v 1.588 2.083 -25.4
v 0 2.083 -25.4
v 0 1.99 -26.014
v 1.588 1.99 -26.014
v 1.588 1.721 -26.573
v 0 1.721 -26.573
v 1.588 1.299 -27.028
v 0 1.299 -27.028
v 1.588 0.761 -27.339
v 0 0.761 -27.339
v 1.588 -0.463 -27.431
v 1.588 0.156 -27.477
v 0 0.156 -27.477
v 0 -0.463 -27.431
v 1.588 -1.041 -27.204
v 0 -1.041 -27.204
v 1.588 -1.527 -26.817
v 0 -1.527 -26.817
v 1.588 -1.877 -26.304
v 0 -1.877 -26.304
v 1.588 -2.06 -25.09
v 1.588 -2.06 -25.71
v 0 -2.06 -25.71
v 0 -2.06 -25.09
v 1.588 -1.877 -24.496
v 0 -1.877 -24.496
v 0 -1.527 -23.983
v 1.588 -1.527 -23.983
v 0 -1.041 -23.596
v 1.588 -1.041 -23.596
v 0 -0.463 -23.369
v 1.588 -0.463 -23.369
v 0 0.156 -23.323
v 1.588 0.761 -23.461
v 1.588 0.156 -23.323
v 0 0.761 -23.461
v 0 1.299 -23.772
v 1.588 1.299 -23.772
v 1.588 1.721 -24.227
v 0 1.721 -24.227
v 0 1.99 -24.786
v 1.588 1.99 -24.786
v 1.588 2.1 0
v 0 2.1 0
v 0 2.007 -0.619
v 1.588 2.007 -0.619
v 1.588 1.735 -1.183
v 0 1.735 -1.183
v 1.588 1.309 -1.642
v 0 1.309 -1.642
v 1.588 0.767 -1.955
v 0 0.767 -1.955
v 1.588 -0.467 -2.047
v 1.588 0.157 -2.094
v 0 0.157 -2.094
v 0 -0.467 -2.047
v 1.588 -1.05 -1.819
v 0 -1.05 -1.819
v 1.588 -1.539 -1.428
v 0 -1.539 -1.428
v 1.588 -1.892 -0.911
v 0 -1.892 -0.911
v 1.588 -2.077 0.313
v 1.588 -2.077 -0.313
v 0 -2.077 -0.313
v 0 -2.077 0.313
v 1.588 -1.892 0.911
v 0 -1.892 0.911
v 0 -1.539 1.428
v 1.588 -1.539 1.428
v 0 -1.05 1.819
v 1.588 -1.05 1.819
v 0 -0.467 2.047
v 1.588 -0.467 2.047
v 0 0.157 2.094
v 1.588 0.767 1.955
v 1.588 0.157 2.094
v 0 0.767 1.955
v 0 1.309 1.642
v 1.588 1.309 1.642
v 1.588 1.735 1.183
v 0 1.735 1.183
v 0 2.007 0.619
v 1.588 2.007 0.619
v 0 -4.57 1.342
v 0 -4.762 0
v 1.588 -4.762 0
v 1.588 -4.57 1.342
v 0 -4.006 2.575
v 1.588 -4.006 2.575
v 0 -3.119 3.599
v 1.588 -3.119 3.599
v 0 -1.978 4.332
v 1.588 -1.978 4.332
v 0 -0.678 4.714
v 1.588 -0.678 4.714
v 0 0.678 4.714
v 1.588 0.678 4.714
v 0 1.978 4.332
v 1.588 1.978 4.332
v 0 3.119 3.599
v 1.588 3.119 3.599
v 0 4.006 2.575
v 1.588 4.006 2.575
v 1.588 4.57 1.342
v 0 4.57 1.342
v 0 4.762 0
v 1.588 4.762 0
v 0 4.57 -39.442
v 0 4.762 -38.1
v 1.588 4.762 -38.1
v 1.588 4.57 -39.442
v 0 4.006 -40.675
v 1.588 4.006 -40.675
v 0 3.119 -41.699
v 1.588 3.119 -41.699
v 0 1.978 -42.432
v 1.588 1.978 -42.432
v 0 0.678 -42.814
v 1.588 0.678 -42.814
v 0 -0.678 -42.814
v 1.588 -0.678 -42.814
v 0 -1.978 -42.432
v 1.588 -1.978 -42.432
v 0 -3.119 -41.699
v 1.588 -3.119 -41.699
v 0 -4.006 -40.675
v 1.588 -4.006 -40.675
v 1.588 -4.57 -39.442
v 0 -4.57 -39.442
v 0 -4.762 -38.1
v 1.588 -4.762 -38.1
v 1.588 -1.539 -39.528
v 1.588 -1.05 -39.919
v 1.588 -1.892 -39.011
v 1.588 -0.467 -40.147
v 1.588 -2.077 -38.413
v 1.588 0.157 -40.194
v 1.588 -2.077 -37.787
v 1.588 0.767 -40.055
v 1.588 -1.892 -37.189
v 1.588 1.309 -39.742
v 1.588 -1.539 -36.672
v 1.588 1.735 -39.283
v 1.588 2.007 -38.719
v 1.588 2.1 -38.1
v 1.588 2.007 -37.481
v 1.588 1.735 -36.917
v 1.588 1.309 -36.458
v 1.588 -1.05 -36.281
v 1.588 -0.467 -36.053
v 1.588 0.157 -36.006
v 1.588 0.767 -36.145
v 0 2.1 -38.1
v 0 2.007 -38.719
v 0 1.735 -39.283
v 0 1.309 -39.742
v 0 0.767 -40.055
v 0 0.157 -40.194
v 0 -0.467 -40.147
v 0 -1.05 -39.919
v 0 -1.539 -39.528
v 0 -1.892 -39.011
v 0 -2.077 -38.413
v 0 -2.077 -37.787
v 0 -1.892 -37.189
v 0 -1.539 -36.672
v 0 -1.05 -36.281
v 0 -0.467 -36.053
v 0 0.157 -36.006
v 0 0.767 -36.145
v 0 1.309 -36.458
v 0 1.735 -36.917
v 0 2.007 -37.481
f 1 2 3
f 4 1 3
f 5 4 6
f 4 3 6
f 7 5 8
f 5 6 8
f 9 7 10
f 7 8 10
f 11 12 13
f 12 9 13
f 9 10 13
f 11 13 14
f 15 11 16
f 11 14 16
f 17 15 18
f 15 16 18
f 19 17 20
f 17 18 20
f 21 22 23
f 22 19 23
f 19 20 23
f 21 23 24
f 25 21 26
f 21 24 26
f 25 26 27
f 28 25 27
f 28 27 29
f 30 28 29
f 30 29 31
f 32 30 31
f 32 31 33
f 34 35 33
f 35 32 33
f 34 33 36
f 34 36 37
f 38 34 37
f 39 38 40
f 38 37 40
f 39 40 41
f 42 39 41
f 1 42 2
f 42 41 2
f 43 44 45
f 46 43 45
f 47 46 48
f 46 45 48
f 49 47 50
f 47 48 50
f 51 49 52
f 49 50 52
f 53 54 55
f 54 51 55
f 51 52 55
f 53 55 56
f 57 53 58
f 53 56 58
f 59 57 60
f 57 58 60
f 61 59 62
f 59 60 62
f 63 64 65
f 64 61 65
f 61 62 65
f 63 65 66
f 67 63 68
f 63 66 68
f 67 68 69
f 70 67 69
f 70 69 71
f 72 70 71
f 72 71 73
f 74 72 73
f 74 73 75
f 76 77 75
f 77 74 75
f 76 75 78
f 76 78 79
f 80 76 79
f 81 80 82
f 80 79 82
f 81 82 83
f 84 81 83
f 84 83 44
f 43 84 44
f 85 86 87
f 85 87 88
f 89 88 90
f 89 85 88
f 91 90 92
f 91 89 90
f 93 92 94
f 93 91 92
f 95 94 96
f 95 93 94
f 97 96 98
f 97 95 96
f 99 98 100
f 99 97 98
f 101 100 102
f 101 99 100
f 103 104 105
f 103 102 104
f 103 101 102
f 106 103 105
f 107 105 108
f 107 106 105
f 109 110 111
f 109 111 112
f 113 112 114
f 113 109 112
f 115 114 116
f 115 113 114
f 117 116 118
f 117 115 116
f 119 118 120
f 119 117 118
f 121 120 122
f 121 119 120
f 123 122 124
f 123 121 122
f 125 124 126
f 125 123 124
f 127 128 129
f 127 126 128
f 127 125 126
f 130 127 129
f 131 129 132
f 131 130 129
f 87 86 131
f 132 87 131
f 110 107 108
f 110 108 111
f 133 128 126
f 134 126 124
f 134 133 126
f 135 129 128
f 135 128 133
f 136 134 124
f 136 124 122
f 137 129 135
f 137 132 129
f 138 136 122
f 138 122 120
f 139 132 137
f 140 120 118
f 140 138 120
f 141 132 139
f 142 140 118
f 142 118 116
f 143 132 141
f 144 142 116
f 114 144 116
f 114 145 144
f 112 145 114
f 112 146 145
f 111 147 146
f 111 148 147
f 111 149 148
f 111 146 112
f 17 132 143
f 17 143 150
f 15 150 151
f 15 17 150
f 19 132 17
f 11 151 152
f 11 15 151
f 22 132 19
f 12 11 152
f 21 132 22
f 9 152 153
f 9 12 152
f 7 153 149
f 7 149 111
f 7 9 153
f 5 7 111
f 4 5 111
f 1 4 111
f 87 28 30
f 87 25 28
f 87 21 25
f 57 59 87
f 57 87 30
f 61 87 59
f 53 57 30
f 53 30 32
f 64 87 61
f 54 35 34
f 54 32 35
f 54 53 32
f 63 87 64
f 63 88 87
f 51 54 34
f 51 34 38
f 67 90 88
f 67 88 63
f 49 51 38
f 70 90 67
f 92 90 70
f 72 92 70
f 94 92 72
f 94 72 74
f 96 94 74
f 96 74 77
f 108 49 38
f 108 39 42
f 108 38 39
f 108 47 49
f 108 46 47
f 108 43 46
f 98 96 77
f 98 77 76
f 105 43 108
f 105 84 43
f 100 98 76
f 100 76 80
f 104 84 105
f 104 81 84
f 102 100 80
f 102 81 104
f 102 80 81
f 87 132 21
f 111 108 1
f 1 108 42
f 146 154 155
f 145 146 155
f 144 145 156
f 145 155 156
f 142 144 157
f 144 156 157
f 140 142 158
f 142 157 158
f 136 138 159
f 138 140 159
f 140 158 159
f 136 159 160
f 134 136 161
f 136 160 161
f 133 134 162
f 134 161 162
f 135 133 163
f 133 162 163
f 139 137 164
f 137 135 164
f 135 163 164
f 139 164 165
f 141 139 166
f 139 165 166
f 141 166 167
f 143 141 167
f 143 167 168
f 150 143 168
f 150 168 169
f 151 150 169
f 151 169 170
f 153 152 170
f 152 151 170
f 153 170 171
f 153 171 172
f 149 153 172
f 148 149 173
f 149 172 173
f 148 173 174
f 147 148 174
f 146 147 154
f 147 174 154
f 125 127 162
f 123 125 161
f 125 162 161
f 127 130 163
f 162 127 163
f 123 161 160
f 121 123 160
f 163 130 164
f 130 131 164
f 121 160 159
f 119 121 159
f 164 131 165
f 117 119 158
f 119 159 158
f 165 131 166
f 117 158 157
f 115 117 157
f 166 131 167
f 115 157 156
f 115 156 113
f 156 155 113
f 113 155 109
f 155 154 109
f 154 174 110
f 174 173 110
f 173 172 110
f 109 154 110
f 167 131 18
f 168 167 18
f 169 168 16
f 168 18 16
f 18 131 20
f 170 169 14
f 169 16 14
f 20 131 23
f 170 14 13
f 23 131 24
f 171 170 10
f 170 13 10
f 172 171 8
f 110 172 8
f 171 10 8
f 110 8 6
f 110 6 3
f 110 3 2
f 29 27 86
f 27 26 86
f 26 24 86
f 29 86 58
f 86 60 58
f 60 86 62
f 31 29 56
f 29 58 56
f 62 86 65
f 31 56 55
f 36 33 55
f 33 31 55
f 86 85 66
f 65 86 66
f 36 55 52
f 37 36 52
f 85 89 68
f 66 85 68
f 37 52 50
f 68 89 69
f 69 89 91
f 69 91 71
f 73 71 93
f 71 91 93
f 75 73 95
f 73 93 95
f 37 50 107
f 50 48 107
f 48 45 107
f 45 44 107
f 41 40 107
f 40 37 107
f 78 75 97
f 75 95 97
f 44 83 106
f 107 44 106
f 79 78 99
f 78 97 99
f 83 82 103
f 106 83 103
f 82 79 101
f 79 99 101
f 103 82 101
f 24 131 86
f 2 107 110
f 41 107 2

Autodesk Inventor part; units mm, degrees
ref_plane "YZ Plane" through (0, 0, 0) normal (1, 0, 0) x (0, 1, 0)
ref_plane "XZ Plane" through (0, 0, 0) normal (0, 1, 0) x (-1, 0, 0)
ref_plane "XY Plane" through (0, 0, 0) normal (0, 0, 1) x (1, 0, 0)
sketch "Sketch1" plane through (0, 0, 0) normal (1, 0, 0) x (0, 1, 0)
  circle A0 centre (0, 0) radius 2.1
  circle A1 centre (0, -25.4) radius 2.0828
  circle A2 centre (0, -38.1) radius 2.1
  arc A3 (4.7625, 0) -> (-4.7625, 0) centre (0, 0) ccw
  arc A4 (-4.7625, -38.1) -> (4.7625, -38.1) centre (0, -38.1) ccw
  line L0 (4.7625, 0) -> (4.7625, -38.1)
  line L1 (-4.7625, 0) -> (-4.7625, -38.1)
  dimension "d0" = 4.2
  dimension "d4" = 4.1656
  dimension "d5" = 4.2
extrude "Extrusion1" add sketch "Sketch1" along normal blind 1.5875
properties part number "Gearbox Gusset" material "Acetal Resin, White"
